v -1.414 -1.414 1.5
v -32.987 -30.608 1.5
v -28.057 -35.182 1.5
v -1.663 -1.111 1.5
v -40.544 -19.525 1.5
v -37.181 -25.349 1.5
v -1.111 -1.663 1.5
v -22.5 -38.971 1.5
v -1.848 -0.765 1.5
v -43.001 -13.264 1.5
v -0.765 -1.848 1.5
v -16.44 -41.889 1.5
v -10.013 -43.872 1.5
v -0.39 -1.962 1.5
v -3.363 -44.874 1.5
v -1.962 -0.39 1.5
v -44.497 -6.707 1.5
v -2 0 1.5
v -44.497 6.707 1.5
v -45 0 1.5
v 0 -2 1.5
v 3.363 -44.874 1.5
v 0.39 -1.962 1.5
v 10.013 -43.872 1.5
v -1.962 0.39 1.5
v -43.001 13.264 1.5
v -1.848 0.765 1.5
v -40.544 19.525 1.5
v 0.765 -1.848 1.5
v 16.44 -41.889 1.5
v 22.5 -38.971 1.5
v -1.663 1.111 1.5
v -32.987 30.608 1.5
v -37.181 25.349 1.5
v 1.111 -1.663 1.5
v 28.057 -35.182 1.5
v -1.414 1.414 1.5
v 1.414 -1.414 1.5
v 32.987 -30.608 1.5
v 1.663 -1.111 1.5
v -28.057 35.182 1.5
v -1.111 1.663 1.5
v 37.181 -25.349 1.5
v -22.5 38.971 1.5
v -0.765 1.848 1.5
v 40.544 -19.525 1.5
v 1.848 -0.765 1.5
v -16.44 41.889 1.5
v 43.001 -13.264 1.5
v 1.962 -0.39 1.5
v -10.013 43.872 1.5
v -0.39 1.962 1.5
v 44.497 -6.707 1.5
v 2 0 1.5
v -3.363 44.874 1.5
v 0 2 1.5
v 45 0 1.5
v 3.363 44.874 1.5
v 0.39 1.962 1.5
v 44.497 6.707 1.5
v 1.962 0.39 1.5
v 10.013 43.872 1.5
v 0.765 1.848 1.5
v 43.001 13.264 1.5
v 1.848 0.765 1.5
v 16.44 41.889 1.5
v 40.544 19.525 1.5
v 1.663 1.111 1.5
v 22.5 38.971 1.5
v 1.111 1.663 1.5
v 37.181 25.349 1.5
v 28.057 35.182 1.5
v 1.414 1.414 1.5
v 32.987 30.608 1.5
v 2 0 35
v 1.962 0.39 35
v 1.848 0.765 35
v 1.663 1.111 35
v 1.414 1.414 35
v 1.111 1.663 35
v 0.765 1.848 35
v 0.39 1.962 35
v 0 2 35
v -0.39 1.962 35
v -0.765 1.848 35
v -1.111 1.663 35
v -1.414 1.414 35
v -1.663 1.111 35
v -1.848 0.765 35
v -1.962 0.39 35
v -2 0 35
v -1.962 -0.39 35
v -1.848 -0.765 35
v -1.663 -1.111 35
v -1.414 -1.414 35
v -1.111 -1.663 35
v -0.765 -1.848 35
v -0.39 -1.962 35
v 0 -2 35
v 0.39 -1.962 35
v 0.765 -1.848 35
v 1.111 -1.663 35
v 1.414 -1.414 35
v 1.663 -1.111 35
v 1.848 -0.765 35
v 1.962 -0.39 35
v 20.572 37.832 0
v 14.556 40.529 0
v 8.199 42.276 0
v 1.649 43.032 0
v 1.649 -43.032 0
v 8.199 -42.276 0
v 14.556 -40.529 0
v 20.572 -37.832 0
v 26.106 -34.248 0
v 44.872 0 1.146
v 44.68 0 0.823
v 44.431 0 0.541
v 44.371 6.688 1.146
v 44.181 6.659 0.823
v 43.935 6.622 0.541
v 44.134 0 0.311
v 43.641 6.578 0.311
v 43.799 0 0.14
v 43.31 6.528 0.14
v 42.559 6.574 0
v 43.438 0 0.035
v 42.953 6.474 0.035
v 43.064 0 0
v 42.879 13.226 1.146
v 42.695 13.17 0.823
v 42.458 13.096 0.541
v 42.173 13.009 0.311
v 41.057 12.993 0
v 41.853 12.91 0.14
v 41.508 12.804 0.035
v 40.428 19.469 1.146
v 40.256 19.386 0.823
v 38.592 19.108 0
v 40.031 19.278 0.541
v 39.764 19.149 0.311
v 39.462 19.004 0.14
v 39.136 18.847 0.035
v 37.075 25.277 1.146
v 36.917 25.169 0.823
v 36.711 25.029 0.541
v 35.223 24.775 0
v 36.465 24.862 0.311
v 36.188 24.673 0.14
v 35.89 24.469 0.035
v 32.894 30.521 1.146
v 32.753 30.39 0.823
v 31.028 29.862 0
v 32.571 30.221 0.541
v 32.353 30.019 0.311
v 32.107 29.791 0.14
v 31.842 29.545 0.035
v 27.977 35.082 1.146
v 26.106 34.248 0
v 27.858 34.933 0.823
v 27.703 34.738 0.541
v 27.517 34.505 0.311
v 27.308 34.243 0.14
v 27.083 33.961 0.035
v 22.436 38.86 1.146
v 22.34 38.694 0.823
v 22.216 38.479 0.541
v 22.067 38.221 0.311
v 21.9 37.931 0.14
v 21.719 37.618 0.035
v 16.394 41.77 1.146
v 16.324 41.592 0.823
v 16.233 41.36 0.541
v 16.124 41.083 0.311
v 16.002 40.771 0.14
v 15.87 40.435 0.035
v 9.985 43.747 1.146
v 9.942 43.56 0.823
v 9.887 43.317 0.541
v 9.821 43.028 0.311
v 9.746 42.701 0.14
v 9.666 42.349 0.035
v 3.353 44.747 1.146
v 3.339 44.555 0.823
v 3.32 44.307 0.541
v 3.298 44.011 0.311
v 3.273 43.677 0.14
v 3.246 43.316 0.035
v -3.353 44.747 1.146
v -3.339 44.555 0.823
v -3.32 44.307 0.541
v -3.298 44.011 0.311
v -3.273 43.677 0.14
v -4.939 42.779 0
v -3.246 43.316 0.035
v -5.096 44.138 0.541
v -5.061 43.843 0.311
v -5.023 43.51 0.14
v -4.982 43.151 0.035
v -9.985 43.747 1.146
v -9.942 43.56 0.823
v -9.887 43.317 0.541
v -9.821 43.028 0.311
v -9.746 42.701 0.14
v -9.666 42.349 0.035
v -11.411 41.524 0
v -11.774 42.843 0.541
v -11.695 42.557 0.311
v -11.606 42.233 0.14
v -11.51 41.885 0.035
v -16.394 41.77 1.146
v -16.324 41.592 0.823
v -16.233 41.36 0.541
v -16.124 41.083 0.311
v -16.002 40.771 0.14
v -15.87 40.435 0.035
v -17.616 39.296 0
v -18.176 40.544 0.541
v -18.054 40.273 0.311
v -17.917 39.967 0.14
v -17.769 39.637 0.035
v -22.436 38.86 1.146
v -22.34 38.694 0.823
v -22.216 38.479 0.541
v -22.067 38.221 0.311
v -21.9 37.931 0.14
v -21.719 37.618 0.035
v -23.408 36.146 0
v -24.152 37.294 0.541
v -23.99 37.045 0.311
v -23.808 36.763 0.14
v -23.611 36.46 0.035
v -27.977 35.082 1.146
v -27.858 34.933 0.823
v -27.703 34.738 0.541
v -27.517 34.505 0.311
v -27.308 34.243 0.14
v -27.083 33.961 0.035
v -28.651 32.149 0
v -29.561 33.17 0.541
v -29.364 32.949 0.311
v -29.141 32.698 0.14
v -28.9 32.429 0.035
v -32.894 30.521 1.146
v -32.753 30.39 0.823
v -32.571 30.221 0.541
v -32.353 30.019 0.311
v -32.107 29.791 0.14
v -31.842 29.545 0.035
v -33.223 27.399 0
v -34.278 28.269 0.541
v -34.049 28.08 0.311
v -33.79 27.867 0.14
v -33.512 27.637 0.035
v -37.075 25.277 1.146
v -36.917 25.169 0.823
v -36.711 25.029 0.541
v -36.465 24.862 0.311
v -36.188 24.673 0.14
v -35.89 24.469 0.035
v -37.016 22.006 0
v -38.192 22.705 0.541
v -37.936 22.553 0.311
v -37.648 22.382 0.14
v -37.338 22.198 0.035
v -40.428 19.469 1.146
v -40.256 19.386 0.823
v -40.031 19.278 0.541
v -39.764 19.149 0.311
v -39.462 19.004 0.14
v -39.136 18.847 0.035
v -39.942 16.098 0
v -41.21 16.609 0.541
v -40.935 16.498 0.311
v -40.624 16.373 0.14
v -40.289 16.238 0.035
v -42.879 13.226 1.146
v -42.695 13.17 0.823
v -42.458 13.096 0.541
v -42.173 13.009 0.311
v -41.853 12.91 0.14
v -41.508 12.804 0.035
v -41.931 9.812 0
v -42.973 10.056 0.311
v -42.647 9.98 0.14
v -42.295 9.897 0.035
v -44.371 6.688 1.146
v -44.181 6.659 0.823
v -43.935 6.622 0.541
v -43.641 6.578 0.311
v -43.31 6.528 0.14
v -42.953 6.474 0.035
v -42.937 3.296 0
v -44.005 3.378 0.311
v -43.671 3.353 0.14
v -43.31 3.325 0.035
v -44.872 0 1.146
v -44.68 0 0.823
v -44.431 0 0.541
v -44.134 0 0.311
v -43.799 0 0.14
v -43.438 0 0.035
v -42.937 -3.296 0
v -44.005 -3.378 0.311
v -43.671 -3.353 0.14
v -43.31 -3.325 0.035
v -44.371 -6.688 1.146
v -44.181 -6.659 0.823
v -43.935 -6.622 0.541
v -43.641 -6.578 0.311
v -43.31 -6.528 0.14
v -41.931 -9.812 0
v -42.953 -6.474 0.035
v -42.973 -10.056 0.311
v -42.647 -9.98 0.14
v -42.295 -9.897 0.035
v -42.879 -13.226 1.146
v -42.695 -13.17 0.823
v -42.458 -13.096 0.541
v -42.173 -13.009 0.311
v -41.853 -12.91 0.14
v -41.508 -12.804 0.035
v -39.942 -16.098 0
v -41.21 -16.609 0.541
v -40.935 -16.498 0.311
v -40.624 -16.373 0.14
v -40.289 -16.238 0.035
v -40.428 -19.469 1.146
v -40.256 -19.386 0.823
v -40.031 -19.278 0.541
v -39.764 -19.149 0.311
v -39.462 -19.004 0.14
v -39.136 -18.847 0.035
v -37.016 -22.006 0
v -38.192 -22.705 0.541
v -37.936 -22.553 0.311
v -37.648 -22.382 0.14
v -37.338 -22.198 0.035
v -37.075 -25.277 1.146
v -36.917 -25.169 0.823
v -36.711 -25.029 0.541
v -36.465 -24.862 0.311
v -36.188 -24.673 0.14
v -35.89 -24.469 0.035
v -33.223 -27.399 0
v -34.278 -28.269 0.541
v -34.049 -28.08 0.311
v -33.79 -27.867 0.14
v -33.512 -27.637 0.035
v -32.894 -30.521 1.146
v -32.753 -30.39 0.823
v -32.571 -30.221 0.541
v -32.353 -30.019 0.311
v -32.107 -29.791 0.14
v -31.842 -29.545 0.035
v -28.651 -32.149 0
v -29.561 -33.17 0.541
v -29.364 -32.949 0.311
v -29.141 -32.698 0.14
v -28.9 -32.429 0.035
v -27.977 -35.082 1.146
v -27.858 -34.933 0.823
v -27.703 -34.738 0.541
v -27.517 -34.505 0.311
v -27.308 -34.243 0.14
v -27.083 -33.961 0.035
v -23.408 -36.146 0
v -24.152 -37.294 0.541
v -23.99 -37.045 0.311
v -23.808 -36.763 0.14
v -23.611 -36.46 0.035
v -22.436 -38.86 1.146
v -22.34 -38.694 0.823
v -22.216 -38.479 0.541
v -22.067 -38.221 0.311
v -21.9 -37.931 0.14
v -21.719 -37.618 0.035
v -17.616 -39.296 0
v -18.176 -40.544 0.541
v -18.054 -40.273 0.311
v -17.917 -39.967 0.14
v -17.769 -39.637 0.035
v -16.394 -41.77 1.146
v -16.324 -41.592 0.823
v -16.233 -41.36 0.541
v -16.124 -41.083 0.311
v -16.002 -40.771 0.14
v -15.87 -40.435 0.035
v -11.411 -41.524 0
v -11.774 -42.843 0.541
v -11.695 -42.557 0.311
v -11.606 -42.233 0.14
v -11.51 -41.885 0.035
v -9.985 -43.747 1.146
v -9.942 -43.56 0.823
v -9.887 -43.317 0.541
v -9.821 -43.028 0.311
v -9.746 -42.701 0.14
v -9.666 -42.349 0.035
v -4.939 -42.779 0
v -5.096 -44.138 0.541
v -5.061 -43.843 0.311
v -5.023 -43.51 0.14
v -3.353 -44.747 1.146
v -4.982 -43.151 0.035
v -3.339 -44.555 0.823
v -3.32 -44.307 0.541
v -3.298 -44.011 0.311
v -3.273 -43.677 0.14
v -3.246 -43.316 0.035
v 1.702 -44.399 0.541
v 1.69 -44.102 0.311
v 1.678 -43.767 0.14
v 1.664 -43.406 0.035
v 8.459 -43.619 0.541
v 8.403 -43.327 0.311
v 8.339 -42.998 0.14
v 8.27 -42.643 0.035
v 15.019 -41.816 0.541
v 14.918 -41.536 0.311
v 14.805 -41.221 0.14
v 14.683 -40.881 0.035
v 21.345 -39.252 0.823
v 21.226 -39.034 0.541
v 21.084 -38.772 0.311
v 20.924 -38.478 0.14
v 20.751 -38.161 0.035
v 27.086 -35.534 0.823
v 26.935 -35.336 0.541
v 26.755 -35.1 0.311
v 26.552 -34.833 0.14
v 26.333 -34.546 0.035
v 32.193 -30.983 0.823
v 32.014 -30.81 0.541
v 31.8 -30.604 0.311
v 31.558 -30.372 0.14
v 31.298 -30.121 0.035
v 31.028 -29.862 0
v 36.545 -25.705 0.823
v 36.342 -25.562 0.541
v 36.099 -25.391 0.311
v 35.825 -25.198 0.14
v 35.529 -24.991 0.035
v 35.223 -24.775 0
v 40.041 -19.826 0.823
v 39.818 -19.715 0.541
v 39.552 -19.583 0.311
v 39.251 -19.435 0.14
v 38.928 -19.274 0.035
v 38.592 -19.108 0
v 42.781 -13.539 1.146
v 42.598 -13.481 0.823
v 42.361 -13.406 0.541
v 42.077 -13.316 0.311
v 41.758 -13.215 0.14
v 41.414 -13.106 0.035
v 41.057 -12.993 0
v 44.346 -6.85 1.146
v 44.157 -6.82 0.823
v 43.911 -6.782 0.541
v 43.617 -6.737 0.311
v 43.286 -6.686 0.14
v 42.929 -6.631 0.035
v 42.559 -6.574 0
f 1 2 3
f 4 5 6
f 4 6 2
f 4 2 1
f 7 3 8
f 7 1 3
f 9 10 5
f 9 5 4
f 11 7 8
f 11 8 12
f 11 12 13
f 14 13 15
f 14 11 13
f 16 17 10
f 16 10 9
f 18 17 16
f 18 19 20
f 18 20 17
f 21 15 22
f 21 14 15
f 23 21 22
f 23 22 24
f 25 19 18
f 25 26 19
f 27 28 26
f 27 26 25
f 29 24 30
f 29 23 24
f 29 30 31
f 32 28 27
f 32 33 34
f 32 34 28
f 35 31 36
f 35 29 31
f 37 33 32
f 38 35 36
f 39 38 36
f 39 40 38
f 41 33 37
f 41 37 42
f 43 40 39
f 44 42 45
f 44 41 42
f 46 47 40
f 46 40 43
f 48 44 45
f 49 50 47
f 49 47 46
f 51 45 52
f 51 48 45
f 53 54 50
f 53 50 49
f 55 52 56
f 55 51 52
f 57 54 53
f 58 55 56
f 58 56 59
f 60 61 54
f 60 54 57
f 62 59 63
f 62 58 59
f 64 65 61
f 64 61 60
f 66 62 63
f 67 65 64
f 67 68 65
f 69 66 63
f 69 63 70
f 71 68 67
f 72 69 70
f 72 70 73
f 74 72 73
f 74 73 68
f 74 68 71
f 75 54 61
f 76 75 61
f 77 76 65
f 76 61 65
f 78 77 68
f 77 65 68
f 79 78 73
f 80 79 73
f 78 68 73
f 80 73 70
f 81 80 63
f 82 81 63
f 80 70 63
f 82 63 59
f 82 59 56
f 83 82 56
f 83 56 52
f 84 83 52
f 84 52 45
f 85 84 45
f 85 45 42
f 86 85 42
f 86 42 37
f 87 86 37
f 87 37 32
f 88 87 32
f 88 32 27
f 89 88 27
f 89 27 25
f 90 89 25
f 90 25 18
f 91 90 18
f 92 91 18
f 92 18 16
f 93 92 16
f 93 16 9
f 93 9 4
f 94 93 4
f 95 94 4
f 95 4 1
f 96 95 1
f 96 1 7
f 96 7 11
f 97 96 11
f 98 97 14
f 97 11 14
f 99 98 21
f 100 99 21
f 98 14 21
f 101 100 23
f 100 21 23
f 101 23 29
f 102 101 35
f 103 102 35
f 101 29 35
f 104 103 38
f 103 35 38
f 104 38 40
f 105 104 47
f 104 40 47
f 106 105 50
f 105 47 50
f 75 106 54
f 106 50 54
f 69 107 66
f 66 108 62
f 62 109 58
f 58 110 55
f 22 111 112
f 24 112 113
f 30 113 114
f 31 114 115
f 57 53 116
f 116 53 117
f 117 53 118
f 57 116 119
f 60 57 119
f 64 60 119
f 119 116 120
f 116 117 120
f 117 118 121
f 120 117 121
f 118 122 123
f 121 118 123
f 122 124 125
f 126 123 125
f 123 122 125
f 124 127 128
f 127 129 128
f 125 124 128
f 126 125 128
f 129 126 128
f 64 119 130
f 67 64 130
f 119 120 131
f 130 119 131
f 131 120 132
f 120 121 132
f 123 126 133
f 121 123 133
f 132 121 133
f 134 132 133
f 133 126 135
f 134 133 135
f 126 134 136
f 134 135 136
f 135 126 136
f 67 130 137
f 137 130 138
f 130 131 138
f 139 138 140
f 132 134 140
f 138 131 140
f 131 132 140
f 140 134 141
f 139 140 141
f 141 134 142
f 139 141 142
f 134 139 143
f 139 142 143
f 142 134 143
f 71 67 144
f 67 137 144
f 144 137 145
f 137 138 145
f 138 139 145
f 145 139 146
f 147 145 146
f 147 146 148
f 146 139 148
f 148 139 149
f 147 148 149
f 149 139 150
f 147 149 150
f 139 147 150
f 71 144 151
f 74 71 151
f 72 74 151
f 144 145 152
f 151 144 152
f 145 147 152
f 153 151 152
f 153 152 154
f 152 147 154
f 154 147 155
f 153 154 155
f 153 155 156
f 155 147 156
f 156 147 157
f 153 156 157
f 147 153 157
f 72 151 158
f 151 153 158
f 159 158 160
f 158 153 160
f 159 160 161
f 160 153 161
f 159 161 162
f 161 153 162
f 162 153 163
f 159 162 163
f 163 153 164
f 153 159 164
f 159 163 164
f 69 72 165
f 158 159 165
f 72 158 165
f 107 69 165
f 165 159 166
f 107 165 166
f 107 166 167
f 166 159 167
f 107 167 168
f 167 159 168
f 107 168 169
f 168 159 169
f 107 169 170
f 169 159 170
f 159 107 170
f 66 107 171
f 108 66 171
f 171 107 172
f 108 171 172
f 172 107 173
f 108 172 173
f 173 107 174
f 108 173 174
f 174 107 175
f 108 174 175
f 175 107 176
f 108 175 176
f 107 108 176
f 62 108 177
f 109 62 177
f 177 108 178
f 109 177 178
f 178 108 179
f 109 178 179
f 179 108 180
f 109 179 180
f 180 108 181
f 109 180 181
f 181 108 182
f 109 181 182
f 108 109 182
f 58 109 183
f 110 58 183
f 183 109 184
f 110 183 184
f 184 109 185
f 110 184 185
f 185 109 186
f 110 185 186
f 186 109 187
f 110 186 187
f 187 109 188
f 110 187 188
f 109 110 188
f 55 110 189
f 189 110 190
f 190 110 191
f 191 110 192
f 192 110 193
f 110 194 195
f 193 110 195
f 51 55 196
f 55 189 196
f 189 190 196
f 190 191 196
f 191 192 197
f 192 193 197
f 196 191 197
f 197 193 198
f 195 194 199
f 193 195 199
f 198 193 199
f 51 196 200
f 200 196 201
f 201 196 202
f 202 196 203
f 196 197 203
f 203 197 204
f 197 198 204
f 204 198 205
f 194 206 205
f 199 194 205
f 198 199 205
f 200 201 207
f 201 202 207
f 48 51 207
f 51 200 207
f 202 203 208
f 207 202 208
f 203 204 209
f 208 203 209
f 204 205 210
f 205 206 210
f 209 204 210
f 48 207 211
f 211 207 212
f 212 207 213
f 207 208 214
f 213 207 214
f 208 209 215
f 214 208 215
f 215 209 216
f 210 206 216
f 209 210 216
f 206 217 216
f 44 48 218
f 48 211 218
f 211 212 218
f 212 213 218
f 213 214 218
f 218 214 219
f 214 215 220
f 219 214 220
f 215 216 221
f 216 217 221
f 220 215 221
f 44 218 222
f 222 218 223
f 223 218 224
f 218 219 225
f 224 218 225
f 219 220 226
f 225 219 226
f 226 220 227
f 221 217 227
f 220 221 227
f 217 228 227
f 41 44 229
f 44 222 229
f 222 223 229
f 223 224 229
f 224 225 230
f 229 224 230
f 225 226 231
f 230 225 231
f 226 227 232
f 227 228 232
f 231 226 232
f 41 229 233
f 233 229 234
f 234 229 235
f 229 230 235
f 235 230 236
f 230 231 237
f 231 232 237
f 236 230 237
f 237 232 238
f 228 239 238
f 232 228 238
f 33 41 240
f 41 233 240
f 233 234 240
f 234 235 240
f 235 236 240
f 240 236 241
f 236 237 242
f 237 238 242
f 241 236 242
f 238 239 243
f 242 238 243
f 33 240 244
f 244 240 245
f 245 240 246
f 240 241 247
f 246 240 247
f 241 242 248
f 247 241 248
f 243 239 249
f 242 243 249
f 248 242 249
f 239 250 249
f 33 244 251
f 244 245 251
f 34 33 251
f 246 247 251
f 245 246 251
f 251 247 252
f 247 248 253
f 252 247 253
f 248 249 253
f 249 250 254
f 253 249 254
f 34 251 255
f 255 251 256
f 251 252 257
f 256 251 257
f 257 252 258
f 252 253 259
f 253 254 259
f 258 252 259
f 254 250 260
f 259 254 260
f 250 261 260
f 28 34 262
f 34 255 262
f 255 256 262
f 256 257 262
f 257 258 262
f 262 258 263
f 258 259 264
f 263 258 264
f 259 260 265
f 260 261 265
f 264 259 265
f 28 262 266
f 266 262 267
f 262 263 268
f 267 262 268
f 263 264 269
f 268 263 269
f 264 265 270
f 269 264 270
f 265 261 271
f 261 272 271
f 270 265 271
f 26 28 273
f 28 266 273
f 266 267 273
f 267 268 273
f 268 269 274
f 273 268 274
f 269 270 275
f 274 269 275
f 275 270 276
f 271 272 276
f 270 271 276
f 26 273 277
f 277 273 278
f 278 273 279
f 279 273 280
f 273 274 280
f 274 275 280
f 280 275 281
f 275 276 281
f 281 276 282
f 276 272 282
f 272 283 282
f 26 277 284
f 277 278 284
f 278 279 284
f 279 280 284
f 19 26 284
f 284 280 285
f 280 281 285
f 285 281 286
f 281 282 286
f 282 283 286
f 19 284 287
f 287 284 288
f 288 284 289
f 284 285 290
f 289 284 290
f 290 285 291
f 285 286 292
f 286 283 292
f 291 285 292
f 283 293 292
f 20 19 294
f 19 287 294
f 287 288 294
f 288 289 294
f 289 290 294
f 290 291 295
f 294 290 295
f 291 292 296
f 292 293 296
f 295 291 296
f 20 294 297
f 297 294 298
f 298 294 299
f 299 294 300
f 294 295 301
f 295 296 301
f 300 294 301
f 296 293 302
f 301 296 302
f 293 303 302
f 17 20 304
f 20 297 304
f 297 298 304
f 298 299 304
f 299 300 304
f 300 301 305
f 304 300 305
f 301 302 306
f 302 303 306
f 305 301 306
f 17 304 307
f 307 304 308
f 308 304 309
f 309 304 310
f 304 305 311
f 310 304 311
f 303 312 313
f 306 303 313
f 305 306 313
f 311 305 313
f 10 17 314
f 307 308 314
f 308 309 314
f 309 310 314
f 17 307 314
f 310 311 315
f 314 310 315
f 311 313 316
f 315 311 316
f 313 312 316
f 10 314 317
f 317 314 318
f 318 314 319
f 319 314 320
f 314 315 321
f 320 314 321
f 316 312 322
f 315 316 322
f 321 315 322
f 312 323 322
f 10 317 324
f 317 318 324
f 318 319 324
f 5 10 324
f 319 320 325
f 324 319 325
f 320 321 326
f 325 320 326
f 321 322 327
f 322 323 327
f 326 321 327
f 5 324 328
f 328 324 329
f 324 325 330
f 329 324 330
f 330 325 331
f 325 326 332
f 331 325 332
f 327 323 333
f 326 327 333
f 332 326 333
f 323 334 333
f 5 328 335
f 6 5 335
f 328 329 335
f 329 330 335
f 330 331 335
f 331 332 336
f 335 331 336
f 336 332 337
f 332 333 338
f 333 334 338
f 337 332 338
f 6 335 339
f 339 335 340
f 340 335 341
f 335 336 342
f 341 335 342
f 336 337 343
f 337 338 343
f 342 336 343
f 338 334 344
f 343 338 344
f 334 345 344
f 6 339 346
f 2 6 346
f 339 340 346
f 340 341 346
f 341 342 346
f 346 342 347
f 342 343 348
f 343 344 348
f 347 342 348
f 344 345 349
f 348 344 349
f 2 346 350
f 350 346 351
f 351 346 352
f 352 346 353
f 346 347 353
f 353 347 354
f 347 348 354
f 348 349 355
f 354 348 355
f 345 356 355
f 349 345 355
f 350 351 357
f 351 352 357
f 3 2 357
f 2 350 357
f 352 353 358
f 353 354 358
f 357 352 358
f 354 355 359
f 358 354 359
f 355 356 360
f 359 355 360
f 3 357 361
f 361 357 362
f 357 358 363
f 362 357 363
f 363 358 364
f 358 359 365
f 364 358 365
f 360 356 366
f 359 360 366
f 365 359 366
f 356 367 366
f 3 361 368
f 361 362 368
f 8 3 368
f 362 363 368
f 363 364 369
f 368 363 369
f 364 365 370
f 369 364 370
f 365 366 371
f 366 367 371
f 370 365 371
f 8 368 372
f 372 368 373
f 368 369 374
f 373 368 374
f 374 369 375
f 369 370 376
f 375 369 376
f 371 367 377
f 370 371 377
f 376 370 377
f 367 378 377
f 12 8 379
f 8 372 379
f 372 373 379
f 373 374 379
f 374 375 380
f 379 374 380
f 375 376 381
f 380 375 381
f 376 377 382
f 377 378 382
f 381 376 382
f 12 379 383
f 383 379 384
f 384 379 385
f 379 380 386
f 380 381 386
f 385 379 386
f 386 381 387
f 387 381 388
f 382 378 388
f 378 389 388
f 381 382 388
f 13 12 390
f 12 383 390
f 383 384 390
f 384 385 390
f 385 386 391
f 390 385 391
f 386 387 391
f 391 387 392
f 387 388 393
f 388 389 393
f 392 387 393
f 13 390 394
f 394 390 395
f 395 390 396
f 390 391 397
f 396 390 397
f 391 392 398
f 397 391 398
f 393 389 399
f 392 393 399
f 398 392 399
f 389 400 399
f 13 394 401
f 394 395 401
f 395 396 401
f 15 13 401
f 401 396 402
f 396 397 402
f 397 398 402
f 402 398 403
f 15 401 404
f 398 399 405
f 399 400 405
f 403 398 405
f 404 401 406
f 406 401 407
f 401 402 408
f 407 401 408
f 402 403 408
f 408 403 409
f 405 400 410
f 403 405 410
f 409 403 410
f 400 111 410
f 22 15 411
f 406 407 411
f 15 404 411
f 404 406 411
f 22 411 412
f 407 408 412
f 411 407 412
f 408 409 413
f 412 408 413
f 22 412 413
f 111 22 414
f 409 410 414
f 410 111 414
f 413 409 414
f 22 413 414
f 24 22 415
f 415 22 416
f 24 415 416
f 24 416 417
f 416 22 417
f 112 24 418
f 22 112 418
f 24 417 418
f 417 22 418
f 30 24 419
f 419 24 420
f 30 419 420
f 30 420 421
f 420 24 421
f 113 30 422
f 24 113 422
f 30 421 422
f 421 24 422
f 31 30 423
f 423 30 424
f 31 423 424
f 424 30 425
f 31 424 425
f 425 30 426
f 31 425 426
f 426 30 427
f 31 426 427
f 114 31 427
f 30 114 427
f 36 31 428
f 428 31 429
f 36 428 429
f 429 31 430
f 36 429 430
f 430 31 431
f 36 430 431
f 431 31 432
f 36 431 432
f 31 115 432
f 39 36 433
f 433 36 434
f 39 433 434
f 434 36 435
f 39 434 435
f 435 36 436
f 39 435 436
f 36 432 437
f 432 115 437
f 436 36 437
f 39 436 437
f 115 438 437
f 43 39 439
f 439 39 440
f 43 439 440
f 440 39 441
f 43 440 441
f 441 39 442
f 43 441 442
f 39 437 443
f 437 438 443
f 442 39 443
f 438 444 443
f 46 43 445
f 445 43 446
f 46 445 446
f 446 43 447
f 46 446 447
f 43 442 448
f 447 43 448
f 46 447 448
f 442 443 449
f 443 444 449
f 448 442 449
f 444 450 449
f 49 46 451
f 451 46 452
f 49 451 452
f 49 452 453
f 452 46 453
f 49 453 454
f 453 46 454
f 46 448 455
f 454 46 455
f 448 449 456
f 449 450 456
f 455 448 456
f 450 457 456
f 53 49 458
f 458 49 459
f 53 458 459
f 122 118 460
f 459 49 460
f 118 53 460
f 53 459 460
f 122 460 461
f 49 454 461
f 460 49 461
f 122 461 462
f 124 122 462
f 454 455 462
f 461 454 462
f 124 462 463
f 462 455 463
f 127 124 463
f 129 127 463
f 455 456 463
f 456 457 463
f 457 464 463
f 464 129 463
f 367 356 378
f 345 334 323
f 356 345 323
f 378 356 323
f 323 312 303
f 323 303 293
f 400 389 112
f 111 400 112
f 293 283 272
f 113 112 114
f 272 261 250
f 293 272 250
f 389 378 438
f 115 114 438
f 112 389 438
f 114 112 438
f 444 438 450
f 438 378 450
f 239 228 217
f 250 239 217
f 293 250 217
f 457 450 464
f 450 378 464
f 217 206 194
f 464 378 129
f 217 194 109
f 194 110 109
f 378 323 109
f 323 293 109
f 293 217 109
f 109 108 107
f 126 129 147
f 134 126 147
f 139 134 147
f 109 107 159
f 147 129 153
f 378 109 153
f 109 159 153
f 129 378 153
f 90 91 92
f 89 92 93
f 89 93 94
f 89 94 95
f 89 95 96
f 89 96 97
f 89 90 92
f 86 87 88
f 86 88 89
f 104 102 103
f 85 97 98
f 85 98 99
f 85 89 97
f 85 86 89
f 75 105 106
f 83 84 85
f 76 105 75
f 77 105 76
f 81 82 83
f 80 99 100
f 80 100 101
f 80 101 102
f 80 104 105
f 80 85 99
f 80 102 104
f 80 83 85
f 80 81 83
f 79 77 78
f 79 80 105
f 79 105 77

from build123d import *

# Parameters (mm, degrees)
F0_R     = 45
F0_R_2   = 2
F1_DEPTH = 1.5
F2_DEPTH = 35


# Not quite as in the source:
# - a fillet or chamfer that OpenCascade refuses, or shapes differently, is made with other operations: its cross-section is extruded or revolved along the edge and cut away or added


with BuildPart() as f1:
    # F0 (on Top) → F1 (new body)
    with BuildSketch(Plane.XY):
        Circle(F0_R)
        Circle(F0_R_2, mode=Mode.SUBTRACT)
    extrude(amount=F1_DEPTH)

    # F0 (on Top) → F2 (join)
    with BuildSketch(Plane.XY):
        Circle(F0_R_2)
    extrude(amount=F2_DEPTH)

    # F3: fillet of radius 2 on 1 edges, made by hand

    # F3_s1 → F3_t2 (revolve, cut)
    with BuildSketch(Plane.XZ):
        with BuildLine():
            ThreePointArc((45, 1.5), (44.2882531983, 0.4188611699), (43.0635083269, 0))
            Line((43.0635083269, 0), (45, 0))
            Line((45, 0), (45, 1.5))
        make_face()
    revolve(axis=Axis((0, 0, 0), (0, 0, 1)), mode=Mode.SUBTRACT)


solid = f1.part
